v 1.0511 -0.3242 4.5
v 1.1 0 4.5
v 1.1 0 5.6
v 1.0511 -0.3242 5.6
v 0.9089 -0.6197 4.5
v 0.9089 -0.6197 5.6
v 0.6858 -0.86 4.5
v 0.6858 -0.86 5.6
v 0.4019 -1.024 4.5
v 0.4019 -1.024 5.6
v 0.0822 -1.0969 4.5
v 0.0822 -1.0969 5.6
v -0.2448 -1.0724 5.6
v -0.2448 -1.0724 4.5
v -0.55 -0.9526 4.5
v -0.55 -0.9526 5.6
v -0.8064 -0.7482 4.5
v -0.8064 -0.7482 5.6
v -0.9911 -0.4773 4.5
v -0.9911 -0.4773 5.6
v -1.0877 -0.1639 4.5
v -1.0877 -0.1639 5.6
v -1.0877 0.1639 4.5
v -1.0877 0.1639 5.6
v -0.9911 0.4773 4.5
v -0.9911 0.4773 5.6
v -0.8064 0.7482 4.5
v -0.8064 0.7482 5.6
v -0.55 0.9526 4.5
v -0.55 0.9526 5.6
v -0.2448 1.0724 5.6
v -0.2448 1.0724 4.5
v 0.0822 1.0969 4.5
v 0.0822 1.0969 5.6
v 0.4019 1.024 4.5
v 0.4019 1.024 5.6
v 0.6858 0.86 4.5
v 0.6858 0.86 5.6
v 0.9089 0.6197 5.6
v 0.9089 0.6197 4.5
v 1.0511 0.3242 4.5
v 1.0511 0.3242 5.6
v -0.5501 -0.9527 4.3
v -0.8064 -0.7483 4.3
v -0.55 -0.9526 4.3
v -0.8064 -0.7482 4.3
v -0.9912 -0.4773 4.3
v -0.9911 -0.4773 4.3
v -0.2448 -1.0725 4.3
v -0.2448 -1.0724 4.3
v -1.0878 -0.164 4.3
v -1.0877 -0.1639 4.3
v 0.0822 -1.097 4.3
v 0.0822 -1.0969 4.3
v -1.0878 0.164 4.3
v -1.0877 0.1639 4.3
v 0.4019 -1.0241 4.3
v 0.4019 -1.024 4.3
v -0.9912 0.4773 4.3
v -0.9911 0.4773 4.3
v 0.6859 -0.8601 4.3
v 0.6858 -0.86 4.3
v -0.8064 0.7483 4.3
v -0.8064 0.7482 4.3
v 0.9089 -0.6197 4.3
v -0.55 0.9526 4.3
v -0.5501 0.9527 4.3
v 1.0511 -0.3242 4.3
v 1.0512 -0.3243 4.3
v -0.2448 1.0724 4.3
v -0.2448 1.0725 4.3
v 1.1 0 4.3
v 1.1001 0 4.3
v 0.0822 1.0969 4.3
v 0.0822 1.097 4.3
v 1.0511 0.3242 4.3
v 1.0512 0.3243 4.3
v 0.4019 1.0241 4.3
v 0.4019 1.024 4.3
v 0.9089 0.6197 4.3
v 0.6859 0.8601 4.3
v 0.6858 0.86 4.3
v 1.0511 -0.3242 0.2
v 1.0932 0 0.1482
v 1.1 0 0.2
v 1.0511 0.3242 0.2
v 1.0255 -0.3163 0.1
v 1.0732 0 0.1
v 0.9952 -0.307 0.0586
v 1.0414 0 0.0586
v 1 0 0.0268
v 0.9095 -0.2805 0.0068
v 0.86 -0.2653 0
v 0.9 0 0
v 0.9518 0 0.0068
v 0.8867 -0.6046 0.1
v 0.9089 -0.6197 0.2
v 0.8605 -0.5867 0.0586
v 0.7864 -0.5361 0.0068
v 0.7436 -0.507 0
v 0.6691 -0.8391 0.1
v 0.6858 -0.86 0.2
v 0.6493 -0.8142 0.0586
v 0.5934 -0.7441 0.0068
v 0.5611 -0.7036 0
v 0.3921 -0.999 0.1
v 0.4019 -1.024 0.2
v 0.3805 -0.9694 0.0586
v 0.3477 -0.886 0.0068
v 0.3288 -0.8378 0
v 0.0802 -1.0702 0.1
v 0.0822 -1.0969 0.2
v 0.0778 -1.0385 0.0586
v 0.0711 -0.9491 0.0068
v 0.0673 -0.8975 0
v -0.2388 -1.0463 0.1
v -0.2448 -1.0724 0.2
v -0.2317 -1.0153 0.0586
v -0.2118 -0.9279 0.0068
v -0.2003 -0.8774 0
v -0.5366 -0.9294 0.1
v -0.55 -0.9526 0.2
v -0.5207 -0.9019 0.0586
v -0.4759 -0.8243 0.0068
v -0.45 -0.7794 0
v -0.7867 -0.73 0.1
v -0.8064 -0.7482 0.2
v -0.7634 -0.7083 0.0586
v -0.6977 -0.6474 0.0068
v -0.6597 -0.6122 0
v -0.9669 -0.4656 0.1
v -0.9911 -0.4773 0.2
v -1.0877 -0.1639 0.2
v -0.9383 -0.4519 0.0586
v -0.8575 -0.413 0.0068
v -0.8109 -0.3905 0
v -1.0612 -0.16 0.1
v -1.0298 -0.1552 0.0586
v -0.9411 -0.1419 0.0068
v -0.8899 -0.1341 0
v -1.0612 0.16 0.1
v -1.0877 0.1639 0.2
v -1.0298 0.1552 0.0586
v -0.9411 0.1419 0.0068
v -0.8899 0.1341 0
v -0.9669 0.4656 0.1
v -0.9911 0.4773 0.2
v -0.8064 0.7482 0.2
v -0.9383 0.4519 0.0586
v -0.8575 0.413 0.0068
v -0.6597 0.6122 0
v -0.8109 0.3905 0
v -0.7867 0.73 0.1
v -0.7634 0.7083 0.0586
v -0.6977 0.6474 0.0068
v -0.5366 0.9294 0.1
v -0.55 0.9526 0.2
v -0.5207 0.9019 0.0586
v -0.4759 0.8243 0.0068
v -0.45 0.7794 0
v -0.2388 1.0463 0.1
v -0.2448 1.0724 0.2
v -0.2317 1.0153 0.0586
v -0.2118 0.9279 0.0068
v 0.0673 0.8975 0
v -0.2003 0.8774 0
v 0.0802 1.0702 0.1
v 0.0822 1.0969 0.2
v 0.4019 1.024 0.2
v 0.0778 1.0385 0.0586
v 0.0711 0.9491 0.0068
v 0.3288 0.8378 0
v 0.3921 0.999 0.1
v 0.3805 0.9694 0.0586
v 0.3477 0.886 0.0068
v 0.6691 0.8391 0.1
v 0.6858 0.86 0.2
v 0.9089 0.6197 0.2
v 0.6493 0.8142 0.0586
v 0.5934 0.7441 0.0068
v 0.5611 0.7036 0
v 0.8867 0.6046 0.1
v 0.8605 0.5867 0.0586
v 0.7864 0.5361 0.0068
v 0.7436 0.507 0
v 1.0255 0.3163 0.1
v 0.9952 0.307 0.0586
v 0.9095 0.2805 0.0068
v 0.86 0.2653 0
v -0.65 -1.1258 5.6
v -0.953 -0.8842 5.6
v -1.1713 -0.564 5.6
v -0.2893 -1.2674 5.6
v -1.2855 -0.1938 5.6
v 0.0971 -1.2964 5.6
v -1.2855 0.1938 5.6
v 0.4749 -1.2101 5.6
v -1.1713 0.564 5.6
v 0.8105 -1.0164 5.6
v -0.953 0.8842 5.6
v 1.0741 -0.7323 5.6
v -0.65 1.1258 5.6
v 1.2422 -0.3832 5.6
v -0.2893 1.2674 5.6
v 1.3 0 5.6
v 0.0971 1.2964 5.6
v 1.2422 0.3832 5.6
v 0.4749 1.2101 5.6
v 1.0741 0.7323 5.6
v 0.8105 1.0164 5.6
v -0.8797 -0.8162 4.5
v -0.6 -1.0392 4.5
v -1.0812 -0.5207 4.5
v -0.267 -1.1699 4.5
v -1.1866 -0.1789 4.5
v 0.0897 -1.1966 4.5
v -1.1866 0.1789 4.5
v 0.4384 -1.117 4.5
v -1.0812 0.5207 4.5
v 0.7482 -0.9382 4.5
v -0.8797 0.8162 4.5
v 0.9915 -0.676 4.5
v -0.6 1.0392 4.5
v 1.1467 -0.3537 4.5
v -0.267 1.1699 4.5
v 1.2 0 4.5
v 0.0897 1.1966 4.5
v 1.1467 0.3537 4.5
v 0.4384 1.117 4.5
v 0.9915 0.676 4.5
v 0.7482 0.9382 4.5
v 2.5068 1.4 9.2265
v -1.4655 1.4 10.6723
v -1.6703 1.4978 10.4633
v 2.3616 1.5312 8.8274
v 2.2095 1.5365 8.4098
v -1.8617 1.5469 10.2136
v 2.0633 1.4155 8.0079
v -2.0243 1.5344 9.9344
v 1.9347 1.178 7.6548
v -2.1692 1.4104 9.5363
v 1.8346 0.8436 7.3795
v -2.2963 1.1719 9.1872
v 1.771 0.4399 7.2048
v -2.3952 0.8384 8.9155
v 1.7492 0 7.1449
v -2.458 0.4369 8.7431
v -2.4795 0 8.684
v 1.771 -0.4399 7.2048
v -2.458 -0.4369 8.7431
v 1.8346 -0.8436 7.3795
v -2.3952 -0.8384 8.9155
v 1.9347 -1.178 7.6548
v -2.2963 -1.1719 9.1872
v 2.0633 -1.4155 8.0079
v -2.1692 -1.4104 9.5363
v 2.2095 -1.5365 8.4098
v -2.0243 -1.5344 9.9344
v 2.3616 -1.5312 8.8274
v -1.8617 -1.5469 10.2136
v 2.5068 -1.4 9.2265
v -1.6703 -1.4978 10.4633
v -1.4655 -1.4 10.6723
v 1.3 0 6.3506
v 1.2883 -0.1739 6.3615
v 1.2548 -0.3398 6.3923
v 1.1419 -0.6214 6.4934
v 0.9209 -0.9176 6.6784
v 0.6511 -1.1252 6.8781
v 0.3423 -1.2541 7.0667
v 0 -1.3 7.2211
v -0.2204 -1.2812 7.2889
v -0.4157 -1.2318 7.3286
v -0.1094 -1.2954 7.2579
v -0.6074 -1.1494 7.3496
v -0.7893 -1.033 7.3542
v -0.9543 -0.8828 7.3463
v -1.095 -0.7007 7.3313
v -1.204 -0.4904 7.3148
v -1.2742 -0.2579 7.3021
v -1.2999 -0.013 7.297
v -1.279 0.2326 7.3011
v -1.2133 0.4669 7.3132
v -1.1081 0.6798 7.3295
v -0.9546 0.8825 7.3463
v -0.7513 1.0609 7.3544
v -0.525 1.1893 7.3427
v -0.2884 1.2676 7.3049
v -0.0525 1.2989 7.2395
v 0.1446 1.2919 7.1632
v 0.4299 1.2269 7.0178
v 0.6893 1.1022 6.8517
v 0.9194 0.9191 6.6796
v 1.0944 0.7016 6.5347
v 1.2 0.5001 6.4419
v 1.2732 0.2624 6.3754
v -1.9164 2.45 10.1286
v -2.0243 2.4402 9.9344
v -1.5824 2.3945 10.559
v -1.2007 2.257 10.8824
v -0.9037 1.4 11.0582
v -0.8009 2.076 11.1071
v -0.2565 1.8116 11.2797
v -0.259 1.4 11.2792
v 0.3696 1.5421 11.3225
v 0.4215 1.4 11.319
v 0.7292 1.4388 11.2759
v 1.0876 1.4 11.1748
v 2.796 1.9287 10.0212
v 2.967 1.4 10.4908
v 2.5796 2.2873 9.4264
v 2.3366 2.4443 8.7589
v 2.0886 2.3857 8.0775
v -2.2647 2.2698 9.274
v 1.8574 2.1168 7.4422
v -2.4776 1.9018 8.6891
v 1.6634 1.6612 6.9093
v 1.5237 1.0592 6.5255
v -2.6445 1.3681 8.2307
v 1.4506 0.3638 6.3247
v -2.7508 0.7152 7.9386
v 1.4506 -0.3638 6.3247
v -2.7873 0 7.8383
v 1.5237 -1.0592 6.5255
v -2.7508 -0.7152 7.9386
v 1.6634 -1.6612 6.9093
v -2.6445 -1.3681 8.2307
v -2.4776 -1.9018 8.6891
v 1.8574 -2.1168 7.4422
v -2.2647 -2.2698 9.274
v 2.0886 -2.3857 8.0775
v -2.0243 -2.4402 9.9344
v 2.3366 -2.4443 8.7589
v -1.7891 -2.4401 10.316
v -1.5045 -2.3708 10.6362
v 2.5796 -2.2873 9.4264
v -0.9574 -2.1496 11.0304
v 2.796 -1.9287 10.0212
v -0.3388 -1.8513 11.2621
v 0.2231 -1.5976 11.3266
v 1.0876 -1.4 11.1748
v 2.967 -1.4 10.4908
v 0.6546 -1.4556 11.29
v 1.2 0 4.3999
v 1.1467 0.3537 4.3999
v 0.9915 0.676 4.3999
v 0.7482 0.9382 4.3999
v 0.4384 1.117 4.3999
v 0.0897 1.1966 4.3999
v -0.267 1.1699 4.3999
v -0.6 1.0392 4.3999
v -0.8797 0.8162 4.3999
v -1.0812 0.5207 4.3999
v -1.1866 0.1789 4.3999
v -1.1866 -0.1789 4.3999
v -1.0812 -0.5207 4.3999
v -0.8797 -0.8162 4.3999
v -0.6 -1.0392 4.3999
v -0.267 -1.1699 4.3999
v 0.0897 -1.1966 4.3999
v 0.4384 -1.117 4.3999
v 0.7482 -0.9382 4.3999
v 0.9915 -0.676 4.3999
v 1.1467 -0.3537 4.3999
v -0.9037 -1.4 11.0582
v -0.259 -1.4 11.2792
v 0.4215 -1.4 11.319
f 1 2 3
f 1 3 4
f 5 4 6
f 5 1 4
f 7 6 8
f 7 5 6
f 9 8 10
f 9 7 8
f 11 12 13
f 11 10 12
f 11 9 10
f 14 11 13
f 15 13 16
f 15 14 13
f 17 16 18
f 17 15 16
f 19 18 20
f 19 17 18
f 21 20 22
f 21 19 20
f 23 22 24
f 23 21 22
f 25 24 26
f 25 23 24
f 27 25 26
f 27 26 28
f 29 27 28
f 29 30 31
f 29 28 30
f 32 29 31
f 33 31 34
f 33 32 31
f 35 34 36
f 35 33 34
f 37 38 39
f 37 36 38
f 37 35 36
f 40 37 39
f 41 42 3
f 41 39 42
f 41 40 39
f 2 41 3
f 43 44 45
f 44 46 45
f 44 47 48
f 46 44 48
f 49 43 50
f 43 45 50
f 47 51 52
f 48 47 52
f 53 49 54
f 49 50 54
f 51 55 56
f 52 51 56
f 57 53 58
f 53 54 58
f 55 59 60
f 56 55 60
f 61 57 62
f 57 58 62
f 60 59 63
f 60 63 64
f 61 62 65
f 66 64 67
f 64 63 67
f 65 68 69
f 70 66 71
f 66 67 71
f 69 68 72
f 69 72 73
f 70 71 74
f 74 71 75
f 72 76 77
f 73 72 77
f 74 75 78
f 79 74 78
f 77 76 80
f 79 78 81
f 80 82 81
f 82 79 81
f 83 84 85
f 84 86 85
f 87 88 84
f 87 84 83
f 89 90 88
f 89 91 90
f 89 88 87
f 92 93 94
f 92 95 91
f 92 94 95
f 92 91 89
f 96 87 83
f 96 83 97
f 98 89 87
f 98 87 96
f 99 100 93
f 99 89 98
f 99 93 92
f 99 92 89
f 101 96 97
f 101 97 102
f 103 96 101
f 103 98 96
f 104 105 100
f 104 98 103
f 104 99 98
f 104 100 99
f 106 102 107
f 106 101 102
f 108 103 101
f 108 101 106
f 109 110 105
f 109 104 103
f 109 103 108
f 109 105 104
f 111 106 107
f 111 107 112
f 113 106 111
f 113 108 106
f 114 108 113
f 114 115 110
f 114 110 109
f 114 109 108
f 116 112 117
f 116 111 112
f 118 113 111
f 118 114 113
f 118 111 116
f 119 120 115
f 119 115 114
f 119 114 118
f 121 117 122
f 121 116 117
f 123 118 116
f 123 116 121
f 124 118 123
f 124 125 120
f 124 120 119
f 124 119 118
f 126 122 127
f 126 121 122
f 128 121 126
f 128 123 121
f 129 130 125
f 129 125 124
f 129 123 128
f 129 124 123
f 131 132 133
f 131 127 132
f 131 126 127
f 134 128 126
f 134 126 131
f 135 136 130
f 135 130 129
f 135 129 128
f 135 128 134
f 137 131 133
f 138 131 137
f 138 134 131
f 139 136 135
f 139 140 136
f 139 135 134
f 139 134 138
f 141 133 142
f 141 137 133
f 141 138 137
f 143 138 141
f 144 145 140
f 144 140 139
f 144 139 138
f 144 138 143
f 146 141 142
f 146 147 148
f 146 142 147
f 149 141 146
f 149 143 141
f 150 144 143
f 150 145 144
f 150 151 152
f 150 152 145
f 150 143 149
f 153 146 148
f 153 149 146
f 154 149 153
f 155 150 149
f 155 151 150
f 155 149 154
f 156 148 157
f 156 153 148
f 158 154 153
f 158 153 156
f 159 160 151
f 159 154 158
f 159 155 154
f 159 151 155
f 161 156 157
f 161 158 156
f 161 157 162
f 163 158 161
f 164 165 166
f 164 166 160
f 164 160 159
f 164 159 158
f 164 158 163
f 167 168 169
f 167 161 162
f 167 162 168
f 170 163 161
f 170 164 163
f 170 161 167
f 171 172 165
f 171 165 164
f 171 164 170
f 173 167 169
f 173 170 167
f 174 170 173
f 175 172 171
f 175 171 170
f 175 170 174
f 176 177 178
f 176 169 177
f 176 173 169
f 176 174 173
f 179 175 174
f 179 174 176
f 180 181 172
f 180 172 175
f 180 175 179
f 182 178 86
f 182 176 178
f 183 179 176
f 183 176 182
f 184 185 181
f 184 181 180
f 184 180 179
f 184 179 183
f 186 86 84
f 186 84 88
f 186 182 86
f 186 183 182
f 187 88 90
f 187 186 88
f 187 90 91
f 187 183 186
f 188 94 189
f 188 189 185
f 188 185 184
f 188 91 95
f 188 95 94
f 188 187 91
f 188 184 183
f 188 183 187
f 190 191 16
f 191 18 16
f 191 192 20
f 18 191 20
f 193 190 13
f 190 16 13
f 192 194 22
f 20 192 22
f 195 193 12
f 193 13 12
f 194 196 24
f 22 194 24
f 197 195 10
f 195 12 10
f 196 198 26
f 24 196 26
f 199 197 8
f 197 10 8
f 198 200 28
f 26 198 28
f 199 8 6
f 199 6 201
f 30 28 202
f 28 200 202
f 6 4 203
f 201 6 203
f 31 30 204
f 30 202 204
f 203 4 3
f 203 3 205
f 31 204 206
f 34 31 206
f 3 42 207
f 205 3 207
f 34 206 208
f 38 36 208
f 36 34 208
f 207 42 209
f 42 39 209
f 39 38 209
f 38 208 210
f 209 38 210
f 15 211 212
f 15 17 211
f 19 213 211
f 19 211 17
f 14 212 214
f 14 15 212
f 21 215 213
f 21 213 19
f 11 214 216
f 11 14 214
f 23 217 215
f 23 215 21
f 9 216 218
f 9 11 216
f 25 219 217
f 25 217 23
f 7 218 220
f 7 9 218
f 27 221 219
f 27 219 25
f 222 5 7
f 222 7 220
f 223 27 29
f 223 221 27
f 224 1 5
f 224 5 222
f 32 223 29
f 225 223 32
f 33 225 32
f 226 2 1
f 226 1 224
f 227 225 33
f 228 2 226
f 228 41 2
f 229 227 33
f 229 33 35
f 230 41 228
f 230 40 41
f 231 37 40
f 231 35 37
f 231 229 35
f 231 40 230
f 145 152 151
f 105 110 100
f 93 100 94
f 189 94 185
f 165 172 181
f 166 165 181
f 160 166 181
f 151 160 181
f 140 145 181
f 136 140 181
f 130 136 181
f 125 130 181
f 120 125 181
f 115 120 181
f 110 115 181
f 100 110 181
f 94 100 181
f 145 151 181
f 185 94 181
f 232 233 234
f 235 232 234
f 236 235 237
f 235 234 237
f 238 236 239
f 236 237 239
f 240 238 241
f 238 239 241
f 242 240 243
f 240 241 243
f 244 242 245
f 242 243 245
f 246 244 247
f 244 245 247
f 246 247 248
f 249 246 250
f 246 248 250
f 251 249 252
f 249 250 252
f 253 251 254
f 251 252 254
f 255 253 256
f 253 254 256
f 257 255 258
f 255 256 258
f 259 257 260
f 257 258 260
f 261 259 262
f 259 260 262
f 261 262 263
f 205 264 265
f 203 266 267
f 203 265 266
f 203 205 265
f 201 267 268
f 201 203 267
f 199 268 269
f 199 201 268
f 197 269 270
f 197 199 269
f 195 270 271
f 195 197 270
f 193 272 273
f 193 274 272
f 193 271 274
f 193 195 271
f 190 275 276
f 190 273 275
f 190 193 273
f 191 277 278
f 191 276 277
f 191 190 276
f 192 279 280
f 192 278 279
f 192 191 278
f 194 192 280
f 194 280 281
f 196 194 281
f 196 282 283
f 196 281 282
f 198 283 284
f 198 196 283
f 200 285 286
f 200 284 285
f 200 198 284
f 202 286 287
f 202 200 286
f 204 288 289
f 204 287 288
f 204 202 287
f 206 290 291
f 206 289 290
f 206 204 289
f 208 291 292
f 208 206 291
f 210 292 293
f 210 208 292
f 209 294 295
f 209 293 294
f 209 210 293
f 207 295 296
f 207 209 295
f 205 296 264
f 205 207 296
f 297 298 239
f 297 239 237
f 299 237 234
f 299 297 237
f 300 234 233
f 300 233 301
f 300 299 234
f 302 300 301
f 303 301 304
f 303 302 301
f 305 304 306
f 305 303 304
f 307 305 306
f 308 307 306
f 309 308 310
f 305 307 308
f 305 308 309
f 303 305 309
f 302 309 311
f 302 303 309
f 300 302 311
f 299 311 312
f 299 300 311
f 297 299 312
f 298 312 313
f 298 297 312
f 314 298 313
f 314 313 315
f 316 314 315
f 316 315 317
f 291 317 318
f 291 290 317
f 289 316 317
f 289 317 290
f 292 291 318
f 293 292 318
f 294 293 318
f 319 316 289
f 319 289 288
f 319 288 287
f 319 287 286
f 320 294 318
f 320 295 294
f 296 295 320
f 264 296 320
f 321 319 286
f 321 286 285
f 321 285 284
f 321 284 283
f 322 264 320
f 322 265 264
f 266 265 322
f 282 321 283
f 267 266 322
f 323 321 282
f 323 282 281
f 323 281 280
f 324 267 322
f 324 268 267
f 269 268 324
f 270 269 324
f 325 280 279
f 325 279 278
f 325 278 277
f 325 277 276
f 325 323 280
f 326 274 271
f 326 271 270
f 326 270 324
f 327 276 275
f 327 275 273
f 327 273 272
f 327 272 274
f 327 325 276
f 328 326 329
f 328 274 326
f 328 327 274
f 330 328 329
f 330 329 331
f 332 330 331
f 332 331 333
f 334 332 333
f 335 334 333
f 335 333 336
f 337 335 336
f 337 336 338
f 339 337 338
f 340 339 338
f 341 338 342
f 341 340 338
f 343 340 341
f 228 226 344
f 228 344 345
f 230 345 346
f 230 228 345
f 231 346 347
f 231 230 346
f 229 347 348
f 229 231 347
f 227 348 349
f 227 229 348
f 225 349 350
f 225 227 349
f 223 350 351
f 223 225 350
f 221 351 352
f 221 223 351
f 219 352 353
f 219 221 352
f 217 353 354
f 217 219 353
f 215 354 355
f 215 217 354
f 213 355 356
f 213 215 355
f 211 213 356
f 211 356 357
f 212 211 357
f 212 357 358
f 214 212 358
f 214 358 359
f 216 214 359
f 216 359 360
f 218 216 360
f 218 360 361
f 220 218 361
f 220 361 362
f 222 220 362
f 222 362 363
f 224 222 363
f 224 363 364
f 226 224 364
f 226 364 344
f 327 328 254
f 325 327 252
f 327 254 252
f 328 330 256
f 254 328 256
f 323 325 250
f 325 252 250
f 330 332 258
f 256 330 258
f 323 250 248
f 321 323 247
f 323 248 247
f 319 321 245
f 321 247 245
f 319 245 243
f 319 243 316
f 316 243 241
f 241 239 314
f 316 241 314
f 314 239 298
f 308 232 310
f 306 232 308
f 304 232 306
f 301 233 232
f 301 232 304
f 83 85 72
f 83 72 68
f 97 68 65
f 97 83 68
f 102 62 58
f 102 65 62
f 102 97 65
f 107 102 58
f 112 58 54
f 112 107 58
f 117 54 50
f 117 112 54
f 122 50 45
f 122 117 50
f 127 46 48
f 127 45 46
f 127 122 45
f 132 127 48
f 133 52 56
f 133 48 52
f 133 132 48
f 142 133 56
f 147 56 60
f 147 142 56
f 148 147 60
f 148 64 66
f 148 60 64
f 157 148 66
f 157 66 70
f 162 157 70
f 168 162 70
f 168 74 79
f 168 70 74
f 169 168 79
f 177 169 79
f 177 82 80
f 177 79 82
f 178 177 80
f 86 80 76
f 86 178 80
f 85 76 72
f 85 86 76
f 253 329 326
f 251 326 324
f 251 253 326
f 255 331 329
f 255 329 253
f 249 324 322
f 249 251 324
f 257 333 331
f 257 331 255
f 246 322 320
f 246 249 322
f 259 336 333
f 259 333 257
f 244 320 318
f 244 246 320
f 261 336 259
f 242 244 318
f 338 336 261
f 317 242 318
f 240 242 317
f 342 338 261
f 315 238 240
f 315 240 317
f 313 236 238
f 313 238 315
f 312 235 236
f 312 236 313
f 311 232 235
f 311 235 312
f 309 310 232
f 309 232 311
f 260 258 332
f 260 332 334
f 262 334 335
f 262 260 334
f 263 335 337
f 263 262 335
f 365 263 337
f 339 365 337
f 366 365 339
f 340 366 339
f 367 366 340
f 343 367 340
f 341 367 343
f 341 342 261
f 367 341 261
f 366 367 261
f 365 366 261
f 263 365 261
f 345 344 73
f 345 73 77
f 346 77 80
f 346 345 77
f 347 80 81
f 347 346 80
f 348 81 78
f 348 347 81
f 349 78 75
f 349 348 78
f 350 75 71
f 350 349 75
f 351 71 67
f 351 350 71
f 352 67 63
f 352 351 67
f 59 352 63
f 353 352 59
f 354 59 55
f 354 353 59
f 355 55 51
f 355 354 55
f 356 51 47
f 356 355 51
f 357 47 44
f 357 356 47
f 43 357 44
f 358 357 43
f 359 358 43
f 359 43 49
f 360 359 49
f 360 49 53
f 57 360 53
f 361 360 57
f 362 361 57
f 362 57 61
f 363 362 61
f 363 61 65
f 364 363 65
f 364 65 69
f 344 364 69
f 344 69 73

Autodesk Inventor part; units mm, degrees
sketch "Sketch1" plane through (0, 0, 0) normal (0, 0, 1) x (1, 0, 0)
  circle A0 centre (0, 0) radius 1.1
  dimension "d0" = 2.2
extrude "Extrusion1" add sketch "Sketch1" along normal blind 5.6
ref_plane "Work Plane1" through (0, 0, 4.5) normal (0, 0, 1) x (1, 0, 0)
sketch "Sketch2" plane through (0, 0, 4.5) normal (0, 0, 1) x (1, 0, 0)
  circle A0 centre (0, 0) radius 1.1 projected
  circle A1 centre (0, 0) radius 1.2
  dimension "d4" = 0.1
extrude "Extrusion2" add sketch "Sketch2" against normal blind 0.2
chamfer "Chamfer1" distance 0.1 angle 45 1 edges at (-1.2, 0, 4.3)
fillet "Fillet1" radius 0.2 1 edges at (-1.1, 0, 0)
sketch "Sketch3" plane through (0, 0, 5.6) normal (0, 0, 1) x (1, 0, 0)
  circle A0 centre (0, 0) radius 1.1 projected
  circle A1 centre (0, 0) radius 1.3
  dimension "d11" = 0.2
extrude "Extrusion3" add sketch "Sketch3" along normal blind 3 contours A0 | A1
ref_plane "Work Plane3" through (-4.9804, 0, 1.8127) normal (0.9396926, 0, -0.3420201) x (0, 1, 0)
ref_plane "Work Plane2" through (0, 0, 0) normal (0.9396926, 0, -0.3420201) x (0, 1, 0)
sketch "Sketch4" plane through (-4.9804, 0, 1.8127) normal (0.9396926, 0, -0.3420201) x (0, 1, 0)
  ellipse E0 centre (0, 5.2623) end of major axis (1.3, 5.2623) minor radius 0.4446 projected
  line L0 (-1.3, 5.2623) -> (-1.3, 8.0814) projected
  circle A0 centre (0, 8.8623) radius 2.45
  point P0 (0, 0)
  dimension "d16" = 4.9
  dimension "d17" = 3.6
  dimension "d18" = 1.3
extrude "Extrusion4" add sketch "Sketch4" along normal blind 4.5 contours A0
sketch "Sketch5" plane through (-1.9493, 0, 10.1405) normal (-0.9396926, 0, 0.3420201) x (0.3420201, 0, 0.9396926)
  circle A0 centre (0, 0) radius 2.45 projected
  arc A1 (0.6652, 1.4) -> (0.6652, -1.4) centre (0, 0) ccw
  line L0 (0.6652, 1.4) -> (3.89, 1.4)
  line L1 (3.89, 1.4) -> (3.89, -1.4)
  line L2 (3.89, -1.4) -> (0.6652, -1.4)
  point P0 (-8.8623, 0)
  dimension "d21" = 0.9
  dimension "d22" = 1.4
  dimension "d23" = 1.4
  dimension "d25" = 3.89
extrude "Extrusion5" cut sketch "Sketch5" against normal blind 4.5 contours A0 L2 A1 L0 | A0 L0 L1 L2 picked at (1.2601, 0)
ref_plane "Work Plane4" through (0, 3, 0) normal (0, 1, 0) x (-1, 0, 0)
sketch "Sketch6" plane through (0, 3, 0) normal (0, 1, 0) x (-1, 0, 0)
  line L0 (-1.0876, 11.1748) -> (1.2616, 12.0299)
  line L1 (2.0243, 9.9344) -> (1.2616, 12.0299)
  arc A0 (2.0243, 9.9344) -> (-1.0876, 11.1748) centre (-0.227, 8.8102) ccw
  point P0 (0, 0)
  dimension "d29" = 2.5
  dimension "d30" = 2.23
extrude "Extrusion6" cut sketch "Sketch6" against normal through all
properties part number "Lego hand"
